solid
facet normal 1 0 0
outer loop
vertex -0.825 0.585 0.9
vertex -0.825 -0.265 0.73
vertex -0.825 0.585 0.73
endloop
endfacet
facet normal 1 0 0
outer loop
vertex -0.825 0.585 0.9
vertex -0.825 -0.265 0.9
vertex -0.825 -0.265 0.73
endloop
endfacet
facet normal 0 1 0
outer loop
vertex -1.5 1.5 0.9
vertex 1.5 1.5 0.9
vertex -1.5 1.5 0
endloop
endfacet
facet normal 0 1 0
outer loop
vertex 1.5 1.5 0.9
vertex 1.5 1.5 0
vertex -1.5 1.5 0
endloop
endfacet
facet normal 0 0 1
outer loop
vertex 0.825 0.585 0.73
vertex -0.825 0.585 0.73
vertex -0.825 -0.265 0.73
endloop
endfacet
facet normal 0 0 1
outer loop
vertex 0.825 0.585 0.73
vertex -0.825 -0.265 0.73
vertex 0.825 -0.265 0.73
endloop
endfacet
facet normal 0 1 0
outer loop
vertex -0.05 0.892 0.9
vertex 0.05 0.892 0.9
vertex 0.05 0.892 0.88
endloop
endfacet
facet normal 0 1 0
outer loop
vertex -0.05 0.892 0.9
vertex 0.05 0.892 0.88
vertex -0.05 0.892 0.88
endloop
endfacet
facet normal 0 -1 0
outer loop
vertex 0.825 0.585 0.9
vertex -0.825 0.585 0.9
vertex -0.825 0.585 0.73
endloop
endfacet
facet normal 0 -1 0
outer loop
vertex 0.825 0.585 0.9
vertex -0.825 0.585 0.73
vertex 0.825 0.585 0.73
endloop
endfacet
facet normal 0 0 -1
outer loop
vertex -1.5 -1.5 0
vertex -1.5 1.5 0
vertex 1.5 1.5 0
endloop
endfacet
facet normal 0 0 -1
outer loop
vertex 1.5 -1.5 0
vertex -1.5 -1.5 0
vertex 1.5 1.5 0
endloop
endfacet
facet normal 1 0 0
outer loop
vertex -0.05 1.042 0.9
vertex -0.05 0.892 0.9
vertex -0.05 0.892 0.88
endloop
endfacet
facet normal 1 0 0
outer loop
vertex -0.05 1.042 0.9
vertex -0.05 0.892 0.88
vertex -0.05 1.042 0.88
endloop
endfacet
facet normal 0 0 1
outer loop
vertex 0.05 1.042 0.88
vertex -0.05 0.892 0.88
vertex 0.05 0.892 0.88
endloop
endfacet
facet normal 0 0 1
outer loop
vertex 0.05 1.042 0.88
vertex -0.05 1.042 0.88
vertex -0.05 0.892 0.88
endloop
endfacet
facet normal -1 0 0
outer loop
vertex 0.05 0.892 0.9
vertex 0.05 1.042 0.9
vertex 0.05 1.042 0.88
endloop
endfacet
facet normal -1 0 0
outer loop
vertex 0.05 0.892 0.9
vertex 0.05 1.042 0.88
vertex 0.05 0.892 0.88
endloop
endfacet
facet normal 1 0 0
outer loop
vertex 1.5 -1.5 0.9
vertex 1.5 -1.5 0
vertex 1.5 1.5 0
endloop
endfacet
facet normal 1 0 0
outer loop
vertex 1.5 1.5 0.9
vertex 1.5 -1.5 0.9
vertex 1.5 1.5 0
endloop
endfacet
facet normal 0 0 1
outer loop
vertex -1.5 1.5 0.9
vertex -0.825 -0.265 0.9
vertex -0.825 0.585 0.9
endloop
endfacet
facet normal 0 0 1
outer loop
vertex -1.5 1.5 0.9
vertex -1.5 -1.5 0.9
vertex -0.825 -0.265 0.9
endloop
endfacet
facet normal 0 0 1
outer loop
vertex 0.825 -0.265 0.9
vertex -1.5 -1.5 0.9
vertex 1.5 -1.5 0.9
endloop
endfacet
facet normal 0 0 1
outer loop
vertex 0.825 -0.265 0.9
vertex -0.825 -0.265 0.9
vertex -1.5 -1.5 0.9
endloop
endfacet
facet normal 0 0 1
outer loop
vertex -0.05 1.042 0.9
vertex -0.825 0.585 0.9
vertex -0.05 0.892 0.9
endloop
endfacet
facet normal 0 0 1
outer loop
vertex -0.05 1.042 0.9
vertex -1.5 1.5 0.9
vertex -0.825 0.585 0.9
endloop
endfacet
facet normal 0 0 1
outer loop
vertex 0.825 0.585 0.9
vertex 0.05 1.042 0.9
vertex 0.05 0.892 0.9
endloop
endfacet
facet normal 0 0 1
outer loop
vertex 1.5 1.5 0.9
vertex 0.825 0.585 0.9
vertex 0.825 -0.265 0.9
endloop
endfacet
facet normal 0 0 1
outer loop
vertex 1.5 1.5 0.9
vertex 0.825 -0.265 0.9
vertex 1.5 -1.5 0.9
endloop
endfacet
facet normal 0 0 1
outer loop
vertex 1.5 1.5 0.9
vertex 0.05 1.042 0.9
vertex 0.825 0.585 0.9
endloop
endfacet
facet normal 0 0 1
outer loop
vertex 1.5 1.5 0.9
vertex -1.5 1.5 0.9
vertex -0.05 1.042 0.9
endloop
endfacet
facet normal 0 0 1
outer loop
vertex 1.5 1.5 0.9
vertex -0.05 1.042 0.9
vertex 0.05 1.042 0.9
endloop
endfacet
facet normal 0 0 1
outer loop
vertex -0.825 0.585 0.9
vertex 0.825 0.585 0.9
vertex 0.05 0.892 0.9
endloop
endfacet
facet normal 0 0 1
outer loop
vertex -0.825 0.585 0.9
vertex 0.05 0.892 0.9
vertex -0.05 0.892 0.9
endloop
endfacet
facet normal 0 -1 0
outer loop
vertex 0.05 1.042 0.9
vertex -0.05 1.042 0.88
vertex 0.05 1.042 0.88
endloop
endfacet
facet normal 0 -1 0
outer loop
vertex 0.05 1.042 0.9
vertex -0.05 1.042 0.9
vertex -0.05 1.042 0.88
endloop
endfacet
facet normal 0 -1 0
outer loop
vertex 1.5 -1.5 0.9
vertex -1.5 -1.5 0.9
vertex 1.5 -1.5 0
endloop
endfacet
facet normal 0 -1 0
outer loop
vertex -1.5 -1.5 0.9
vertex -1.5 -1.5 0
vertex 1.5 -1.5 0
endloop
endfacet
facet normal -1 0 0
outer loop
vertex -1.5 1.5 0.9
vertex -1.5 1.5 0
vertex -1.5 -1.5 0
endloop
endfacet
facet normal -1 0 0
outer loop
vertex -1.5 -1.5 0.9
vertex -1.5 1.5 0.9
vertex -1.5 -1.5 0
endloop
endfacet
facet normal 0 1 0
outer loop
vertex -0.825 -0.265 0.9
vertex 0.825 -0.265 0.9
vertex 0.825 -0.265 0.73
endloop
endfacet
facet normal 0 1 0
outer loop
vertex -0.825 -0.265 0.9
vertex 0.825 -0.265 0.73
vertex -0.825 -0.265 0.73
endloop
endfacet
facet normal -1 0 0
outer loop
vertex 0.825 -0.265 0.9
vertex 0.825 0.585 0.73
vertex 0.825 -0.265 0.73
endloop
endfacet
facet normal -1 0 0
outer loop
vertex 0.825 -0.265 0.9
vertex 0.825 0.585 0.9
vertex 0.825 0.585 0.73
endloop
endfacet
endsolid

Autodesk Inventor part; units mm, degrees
ref_plane "YZ Plane" through (0, 0, 0) normal (1, 0, 0) x (0, 1, 0)
ref_plane "XZ Plane" through (0, 0, 0) normal (0, 1, 0) x (-1, 0, 0)
ref_plane "XY Plane" through (0, 0, 0) normal (0, 0, 1) x (1, 0, 0)
sketch "Skizze1" plane through (0, 0, 0) normal (0, 0, 1) x (1, 0, 0)
  line L0 (-1.5, -1.5) -> (1.5, -1.5)
  line L1 (1.5, -1.5) -> (1.5, 1.5)
  line L2 (1.5, 1.5) -> (-1.5, 1.5)
  line L3 (-1.5, 1.5) -> (-1.5, -1.5)
  line L4 (-1.5, -1.5) -> (1.5, 1.5) construction
  line L5 (1.5, -1.5) -> (-1.5, 1.5) construction
  point P0 (0, 0)
  dimension "d0" = 3
  dimension "d1" = 3
extrude "Extrusion1" add sketch "Skizze1" along normal blind 0.9
sketch "Skizze2" plane through (0, 0, 0.9) normal (0, 0, 1) x (1, 0, 0)
  line L0 (-0.825, 0.585) -> (0.825, 0.585)
  line L1 (0.825, 0.585) -> (0.825, -0.265)
  line L2 (0.825, -0.265) -> (-0.825, -0.265)
  line L3 (-0.825, -0.265) -> (-0.825, 0.585)
  line L4 (-0.825, 0.585) -> (0.825, -0.265) construction
  line L5 (0.825, 0.585) -> (-0.825, -0.265) construction
  line L6 (0, 2.1) -> (0, -2.1) projected
  point P0 (0, 0)
  point P1 (0, 0.16)
  point P2 (0, 0.16)
  dimension "d4" = 1.65
  dimension "d5" = 0.85
  dimension "d6" = 0.16
extrude "Extrusion2" cut sketch "Skizze2" against normal blind 0.17
sketch "Skizze3" plane through (0, 0, 0.9) normal (0, 0, 1) x (1, 0, 0)
  line L0 (0, 2.1) -> (0, -2.1) projected
  line L1 (-0.05, 1.042) -> (0.05, 1.042)
  line L2 (0.05, 1.042) -> (0.05, 0.892)
  line L3 (0.05, 0.892) -> (-0.05, 0.892)
  line L4 (-0.05, 0.892) -> (-0.05, 1.042)
  line L5 (-0.05, 1.042) -> (0.05, 0.892) construction
  line L6 (0.05, 1.042) -> (-0.05, 0.892) construction
  point P0 (0, 0)
  point P1 (0, 0.967)
  dimension "d9" = 0.967
  dimension "d10" = 0.1
  dimension "d11" = 0.15
extrude "Extrusion3" cut sketch "Skizze3" against normal blind 0.02
properties part number "iC-PX Series Encoder"
